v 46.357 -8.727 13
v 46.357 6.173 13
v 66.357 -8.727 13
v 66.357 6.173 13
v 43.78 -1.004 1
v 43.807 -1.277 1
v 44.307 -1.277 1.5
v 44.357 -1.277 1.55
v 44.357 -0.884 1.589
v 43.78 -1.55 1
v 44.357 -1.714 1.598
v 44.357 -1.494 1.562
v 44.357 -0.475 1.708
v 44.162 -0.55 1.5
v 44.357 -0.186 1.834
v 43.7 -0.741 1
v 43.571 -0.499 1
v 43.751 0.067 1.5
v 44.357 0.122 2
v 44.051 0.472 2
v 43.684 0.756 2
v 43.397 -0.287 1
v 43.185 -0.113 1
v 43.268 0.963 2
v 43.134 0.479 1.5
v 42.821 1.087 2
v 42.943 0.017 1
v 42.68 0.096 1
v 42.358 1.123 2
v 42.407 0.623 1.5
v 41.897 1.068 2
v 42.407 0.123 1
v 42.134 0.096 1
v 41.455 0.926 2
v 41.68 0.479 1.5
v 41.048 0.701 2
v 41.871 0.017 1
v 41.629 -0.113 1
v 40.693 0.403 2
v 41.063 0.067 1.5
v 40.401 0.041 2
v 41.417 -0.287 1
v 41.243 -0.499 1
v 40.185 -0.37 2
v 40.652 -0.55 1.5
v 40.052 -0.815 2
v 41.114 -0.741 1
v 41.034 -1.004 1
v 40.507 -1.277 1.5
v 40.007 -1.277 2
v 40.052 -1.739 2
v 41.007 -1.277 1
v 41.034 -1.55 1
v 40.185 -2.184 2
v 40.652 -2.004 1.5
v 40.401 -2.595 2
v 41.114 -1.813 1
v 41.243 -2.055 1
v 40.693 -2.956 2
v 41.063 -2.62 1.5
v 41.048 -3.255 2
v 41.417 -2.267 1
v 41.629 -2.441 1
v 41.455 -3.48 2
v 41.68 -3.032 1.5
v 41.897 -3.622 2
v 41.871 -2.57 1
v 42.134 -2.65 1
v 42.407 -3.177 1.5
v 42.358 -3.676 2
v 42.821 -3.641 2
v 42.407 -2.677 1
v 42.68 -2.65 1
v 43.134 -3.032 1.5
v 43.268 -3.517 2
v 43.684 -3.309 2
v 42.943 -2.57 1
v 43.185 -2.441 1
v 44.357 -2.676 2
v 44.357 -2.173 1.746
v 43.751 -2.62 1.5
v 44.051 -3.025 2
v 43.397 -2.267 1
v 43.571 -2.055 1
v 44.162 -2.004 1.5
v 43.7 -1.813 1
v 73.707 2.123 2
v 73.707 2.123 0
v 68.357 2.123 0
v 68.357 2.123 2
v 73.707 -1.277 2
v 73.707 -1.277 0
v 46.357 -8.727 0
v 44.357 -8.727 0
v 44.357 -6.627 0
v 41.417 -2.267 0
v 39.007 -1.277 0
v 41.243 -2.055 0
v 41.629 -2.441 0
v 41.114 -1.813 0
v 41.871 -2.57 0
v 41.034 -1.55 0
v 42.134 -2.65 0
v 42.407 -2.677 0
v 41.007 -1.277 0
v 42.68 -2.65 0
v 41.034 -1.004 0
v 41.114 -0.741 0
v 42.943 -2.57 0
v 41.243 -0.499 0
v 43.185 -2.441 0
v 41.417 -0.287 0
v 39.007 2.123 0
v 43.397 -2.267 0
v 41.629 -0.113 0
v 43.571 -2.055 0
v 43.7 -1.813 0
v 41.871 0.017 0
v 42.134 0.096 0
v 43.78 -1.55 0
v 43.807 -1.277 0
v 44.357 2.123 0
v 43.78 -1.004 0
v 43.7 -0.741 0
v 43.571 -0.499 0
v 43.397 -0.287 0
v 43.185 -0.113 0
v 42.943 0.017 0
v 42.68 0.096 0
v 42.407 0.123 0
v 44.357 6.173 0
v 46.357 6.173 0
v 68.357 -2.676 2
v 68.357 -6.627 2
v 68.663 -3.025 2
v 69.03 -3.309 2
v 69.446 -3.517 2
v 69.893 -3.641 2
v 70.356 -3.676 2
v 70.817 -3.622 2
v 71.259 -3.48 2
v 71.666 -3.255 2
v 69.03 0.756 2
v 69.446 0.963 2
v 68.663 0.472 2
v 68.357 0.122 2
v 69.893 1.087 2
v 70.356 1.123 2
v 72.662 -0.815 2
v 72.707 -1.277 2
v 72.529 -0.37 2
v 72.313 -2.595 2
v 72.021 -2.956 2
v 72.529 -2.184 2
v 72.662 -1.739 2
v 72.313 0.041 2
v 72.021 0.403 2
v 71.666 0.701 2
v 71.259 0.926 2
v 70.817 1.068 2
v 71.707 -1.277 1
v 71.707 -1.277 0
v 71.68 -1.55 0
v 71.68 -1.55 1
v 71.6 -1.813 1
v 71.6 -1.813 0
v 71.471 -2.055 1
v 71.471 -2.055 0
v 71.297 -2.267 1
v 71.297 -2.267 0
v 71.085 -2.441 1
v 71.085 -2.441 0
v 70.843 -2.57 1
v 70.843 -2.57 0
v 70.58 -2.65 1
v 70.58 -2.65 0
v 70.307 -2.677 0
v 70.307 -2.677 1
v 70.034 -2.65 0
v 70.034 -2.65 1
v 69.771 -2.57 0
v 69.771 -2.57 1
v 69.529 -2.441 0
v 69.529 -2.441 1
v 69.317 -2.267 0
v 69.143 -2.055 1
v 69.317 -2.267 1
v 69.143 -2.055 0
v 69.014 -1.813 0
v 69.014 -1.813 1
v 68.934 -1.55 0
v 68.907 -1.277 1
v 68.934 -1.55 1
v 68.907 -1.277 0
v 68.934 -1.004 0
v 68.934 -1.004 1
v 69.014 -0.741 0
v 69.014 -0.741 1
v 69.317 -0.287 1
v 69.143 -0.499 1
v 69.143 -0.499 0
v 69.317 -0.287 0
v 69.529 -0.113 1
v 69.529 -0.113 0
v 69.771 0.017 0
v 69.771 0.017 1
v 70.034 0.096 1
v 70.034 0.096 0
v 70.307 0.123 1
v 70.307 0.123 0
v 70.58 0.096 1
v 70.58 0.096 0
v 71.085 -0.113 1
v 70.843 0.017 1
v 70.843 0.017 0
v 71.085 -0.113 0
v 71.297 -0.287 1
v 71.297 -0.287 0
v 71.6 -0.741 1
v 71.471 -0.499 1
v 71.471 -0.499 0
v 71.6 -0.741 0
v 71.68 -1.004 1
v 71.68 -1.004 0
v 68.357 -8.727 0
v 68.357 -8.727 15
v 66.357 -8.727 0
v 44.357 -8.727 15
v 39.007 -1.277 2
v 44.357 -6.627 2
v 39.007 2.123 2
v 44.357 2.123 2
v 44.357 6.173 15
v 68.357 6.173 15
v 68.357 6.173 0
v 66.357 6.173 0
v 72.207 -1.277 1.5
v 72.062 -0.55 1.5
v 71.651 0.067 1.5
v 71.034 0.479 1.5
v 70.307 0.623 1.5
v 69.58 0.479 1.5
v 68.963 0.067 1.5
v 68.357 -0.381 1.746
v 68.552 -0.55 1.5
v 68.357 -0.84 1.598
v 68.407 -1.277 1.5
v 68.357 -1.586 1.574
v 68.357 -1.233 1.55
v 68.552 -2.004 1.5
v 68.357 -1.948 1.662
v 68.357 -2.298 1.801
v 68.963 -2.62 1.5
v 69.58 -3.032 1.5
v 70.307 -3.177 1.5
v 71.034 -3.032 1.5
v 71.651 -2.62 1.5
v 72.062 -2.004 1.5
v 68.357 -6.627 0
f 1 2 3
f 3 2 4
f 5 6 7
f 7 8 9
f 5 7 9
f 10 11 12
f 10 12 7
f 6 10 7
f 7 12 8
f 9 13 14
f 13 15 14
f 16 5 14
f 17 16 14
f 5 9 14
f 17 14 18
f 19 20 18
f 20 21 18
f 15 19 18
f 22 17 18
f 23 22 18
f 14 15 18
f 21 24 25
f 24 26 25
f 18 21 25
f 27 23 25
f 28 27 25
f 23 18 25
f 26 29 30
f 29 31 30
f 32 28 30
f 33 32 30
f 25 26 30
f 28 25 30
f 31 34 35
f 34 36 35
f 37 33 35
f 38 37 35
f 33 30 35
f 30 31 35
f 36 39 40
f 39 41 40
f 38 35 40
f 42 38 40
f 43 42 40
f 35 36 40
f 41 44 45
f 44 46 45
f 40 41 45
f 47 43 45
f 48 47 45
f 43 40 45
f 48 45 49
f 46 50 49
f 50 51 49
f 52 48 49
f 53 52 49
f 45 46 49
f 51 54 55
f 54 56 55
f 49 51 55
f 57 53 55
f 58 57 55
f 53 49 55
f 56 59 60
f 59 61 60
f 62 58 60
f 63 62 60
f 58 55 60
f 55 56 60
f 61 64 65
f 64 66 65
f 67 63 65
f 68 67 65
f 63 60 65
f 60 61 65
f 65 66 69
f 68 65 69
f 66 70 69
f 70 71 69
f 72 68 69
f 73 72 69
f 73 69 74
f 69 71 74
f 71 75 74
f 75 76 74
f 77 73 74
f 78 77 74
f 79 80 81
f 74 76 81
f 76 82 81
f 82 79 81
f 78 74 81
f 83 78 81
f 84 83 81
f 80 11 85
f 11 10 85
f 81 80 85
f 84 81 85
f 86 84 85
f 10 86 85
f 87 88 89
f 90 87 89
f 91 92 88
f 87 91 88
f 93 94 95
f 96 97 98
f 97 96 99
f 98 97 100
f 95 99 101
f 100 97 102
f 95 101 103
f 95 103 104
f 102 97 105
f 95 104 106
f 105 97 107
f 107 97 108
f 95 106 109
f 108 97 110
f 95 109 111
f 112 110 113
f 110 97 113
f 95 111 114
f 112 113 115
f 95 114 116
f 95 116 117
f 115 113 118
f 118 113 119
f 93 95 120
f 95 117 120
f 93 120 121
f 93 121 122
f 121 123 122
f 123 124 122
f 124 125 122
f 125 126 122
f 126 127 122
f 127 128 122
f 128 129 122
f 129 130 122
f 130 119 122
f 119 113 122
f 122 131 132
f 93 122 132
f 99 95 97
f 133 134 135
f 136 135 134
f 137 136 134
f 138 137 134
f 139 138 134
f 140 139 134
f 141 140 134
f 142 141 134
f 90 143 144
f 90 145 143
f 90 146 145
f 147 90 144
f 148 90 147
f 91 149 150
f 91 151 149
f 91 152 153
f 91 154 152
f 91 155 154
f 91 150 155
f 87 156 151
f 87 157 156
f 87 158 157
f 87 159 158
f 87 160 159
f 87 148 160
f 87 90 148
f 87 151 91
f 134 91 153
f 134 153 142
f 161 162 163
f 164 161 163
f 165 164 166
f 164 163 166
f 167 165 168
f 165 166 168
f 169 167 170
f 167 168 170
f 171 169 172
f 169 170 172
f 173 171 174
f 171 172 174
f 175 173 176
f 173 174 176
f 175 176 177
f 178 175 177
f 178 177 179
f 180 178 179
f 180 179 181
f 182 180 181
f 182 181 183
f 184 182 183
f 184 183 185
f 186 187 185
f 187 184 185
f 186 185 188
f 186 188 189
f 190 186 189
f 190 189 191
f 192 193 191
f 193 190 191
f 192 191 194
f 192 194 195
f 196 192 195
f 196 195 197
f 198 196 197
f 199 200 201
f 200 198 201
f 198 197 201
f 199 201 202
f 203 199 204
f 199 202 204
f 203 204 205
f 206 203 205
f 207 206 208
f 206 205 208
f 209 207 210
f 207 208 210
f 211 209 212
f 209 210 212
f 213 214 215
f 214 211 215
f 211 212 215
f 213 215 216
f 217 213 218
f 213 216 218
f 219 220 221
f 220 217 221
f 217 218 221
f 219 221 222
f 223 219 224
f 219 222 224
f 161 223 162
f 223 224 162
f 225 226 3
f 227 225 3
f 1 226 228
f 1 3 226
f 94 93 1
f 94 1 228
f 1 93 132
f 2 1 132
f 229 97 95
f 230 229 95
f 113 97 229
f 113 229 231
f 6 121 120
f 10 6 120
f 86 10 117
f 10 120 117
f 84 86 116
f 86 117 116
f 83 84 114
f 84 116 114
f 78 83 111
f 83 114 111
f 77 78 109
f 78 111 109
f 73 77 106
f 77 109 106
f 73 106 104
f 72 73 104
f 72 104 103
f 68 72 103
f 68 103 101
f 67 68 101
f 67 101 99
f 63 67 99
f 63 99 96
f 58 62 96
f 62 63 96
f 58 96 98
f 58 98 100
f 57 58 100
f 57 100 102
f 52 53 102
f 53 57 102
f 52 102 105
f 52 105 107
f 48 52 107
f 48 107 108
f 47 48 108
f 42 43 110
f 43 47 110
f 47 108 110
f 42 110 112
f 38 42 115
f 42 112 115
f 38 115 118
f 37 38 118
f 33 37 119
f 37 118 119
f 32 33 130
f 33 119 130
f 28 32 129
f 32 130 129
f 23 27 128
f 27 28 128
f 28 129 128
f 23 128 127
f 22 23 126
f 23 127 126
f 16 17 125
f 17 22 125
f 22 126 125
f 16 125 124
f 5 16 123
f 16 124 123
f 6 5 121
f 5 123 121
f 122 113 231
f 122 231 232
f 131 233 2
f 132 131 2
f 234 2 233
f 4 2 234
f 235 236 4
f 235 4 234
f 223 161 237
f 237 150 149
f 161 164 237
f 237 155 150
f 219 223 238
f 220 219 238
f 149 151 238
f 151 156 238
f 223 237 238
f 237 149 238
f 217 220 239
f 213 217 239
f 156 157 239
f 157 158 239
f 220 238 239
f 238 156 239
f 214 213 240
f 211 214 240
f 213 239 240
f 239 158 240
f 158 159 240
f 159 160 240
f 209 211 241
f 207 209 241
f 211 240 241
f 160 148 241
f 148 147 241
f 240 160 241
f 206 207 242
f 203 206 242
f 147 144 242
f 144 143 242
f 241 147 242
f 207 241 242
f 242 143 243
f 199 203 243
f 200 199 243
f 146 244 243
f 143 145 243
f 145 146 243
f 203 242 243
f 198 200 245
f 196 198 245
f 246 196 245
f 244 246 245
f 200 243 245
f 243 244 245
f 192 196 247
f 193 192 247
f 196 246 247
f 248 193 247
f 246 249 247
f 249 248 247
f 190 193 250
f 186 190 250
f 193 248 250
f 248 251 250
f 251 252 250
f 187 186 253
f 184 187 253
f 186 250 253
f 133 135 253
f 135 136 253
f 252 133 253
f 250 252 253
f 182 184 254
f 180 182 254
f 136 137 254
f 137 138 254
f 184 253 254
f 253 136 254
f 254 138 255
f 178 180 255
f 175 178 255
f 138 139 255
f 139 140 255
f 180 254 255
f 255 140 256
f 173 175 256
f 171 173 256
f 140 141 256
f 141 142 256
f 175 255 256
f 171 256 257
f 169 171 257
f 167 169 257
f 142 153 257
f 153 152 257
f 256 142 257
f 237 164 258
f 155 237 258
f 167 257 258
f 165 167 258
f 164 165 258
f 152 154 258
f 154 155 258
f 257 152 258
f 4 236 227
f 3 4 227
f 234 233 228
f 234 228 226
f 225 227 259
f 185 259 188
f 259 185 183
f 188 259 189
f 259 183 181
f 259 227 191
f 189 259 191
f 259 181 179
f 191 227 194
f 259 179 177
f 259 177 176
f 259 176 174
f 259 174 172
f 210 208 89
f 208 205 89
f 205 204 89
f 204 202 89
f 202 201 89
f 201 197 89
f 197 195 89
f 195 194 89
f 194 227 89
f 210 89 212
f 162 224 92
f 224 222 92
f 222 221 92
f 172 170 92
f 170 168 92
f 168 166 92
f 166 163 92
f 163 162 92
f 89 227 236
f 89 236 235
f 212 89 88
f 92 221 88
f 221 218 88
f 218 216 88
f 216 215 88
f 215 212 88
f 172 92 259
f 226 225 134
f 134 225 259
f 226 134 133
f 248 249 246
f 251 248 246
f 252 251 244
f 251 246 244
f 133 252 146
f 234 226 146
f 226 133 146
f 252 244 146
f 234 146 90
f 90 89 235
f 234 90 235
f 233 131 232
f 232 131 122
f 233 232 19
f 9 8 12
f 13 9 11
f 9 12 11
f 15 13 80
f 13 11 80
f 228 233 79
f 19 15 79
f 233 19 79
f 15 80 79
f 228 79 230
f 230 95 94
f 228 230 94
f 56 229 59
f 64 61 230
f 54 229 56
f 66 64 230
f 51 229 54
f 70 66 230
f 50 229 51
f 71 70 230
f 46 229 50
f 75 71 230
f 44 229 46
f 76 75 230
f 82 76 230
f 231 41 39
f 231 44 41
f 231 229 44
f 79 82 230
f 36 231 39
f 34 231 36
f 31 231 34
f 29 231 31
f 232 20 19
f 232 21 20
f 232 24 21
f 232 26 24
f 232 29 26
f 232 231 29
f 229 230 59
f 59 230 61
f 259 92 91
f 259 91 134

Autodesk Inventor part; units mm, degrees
ref_plane "YZ Plane" through (0, 0, 0) normal (1, 0, 0) x (0, 1, 0)
ref_plane "XZ Plane" through (0, 0, 0) normal (0, 1, 0) x (-1, 0, 0)
ref_plane "XY Plane" through (0, 0, 0) normal (0, 0, 1) x (1, 0, 0)
sketch "Esboço4" plane through (0, 0, 0) normal (0, 0, 1) x (1, 0, 0)
  point P0 (0, 0)
  point P1 (43.221, 21.8373)
  point P2 (101.0161, 22.7479)
  point P3 (77.0161, 22.7479)
sketch "Esboço5" plane through (0, 0, 0) normal (0, 0, 1) x (1, 0, 0)
  line L0 (46.357, -8.7268) -> (46.357, 6.1732)
  line L1 (66.357, 6.1732) -> (66.357, -8.7268)
  line L2 (46.357, 6.1732) -> (44.357, 6.1732)
  line L3 (44.357, 6.1732) -> (44.357, -8.7268)
  line L4 (44.357, -8.7268) -> (46.357, -8.7268)
  line L5 (56.357, 6.1732) -> (56.357, -8.7268)
  circle A0 centre (42.407, -1.2768) radius 1.4
  line L6 (39.007, -1.2768) -> (44.357, -6.6268)
  line L7 (39.007, -1.2768) -> (46.573, -1.2768) construction
  line L8 (39.007, -1.2768) -> (39.007, 2.1232)
  line L9 (39.007, 2.1232) -> (44.357, 2.1232)
  line L10 (66.357, -8.7268) -> (66.357, 6.1732)
  line L11 (66.357, 6.1732) -> (68.357, 6.1732)
  line L12 (68.357, 6.1732) -> (68.357, -8.7268)
  line L13 (68.357, -8.7268) -> (66.357, -8.7268)
  circle A1 centre (70.307, -1.2768) radius 1.4
  line L14 (73.707, -1.2768) -> (68.357, -6.6268)
  line L15 (73.707, -1.2768) -> (66.1409, -1.2768) construction
  line L16 (73.707, -1.2768) -> (73.707, 2.1232)
  line L17 (73.707, 2.1232) -> (68.357, 2.1232)
  point P0 (0, 0)
  dimension "d23" = 20
  dimension "d29" = 2
  dimension "d35" = 45
extrude "Extrusão4" add sketch "Esboço5" along normal blind 2
sketch "Esboço6" plane through (0, 0, 2) normal (0, 0, 1) x (1, 0, 0)
  line L0 (46.357, 6.1732) -> (44.357, 6.1732) projected
  line L1 (46.357, 6.1732) -> (44.357, 6.1732)
  line L2 (44.357, -8.7268) -> (46.357, -8.7268) projected
  line L3 (46.357, -8.7268) -> (46.357, 6.1732)
  line L4 (44.357, 6.1732) -> (44.357, -8.7268)
  line L5 (46.357, -8.7268) -> (44.357, -8.7268)
  line L6 (66.357, 6.1732) -> (66.357, -8.7268) projected
  line L7 (68.357, 6.1732) -> (66.357, 6.1732) projected
  line L8 (66.357, 6.1732) -> (68.357, 6.1732)
  line L9 (68.357, 6.1732) -> (68.357, -8.7268)
  line L10 (68.357, -8.7268) -> (66.357, -8.7268)
  line L11 (66.357, -8.7268) -> (66.357, 6.1732)
  point P0 (0, 0)
extrude "Extrusão5" add sketch "Esboço6" along normal blind 11
sketch "Esboço7" plane through (0, 0, 13) normal (0, 0, 1) x (1, 0, 0)
  line L0 (44.357, 6.1732) -> (44.357, 2.1232) projected
  line L1 (68.357, -8.7268) -> (68.357, 6.1732) projected
  line L2 (44.357, 6.1732) -> (68.357, 6.1732)
  line L3 (68.357, 6.1732) -> (68.357, -8.7268)
  line L4 (68.357, -8.7268) -> (44.357, -8.7268)
  line L5 (44.357, -8.7268) -> (44.357, 6.1732)
  point P0 (0, 0)
extrude "Extrusão6" add sketch "Esboço7" along normal blind 2
chamfer "Chanfro1" distance 1 angle 45 1 edges at (68.907, -1.2768, 2)
chamfer "Chanfro2" distance 1 angle 45 1 edges at (41.007, -1.2768, 2)
properties part number "protetor_luz"
